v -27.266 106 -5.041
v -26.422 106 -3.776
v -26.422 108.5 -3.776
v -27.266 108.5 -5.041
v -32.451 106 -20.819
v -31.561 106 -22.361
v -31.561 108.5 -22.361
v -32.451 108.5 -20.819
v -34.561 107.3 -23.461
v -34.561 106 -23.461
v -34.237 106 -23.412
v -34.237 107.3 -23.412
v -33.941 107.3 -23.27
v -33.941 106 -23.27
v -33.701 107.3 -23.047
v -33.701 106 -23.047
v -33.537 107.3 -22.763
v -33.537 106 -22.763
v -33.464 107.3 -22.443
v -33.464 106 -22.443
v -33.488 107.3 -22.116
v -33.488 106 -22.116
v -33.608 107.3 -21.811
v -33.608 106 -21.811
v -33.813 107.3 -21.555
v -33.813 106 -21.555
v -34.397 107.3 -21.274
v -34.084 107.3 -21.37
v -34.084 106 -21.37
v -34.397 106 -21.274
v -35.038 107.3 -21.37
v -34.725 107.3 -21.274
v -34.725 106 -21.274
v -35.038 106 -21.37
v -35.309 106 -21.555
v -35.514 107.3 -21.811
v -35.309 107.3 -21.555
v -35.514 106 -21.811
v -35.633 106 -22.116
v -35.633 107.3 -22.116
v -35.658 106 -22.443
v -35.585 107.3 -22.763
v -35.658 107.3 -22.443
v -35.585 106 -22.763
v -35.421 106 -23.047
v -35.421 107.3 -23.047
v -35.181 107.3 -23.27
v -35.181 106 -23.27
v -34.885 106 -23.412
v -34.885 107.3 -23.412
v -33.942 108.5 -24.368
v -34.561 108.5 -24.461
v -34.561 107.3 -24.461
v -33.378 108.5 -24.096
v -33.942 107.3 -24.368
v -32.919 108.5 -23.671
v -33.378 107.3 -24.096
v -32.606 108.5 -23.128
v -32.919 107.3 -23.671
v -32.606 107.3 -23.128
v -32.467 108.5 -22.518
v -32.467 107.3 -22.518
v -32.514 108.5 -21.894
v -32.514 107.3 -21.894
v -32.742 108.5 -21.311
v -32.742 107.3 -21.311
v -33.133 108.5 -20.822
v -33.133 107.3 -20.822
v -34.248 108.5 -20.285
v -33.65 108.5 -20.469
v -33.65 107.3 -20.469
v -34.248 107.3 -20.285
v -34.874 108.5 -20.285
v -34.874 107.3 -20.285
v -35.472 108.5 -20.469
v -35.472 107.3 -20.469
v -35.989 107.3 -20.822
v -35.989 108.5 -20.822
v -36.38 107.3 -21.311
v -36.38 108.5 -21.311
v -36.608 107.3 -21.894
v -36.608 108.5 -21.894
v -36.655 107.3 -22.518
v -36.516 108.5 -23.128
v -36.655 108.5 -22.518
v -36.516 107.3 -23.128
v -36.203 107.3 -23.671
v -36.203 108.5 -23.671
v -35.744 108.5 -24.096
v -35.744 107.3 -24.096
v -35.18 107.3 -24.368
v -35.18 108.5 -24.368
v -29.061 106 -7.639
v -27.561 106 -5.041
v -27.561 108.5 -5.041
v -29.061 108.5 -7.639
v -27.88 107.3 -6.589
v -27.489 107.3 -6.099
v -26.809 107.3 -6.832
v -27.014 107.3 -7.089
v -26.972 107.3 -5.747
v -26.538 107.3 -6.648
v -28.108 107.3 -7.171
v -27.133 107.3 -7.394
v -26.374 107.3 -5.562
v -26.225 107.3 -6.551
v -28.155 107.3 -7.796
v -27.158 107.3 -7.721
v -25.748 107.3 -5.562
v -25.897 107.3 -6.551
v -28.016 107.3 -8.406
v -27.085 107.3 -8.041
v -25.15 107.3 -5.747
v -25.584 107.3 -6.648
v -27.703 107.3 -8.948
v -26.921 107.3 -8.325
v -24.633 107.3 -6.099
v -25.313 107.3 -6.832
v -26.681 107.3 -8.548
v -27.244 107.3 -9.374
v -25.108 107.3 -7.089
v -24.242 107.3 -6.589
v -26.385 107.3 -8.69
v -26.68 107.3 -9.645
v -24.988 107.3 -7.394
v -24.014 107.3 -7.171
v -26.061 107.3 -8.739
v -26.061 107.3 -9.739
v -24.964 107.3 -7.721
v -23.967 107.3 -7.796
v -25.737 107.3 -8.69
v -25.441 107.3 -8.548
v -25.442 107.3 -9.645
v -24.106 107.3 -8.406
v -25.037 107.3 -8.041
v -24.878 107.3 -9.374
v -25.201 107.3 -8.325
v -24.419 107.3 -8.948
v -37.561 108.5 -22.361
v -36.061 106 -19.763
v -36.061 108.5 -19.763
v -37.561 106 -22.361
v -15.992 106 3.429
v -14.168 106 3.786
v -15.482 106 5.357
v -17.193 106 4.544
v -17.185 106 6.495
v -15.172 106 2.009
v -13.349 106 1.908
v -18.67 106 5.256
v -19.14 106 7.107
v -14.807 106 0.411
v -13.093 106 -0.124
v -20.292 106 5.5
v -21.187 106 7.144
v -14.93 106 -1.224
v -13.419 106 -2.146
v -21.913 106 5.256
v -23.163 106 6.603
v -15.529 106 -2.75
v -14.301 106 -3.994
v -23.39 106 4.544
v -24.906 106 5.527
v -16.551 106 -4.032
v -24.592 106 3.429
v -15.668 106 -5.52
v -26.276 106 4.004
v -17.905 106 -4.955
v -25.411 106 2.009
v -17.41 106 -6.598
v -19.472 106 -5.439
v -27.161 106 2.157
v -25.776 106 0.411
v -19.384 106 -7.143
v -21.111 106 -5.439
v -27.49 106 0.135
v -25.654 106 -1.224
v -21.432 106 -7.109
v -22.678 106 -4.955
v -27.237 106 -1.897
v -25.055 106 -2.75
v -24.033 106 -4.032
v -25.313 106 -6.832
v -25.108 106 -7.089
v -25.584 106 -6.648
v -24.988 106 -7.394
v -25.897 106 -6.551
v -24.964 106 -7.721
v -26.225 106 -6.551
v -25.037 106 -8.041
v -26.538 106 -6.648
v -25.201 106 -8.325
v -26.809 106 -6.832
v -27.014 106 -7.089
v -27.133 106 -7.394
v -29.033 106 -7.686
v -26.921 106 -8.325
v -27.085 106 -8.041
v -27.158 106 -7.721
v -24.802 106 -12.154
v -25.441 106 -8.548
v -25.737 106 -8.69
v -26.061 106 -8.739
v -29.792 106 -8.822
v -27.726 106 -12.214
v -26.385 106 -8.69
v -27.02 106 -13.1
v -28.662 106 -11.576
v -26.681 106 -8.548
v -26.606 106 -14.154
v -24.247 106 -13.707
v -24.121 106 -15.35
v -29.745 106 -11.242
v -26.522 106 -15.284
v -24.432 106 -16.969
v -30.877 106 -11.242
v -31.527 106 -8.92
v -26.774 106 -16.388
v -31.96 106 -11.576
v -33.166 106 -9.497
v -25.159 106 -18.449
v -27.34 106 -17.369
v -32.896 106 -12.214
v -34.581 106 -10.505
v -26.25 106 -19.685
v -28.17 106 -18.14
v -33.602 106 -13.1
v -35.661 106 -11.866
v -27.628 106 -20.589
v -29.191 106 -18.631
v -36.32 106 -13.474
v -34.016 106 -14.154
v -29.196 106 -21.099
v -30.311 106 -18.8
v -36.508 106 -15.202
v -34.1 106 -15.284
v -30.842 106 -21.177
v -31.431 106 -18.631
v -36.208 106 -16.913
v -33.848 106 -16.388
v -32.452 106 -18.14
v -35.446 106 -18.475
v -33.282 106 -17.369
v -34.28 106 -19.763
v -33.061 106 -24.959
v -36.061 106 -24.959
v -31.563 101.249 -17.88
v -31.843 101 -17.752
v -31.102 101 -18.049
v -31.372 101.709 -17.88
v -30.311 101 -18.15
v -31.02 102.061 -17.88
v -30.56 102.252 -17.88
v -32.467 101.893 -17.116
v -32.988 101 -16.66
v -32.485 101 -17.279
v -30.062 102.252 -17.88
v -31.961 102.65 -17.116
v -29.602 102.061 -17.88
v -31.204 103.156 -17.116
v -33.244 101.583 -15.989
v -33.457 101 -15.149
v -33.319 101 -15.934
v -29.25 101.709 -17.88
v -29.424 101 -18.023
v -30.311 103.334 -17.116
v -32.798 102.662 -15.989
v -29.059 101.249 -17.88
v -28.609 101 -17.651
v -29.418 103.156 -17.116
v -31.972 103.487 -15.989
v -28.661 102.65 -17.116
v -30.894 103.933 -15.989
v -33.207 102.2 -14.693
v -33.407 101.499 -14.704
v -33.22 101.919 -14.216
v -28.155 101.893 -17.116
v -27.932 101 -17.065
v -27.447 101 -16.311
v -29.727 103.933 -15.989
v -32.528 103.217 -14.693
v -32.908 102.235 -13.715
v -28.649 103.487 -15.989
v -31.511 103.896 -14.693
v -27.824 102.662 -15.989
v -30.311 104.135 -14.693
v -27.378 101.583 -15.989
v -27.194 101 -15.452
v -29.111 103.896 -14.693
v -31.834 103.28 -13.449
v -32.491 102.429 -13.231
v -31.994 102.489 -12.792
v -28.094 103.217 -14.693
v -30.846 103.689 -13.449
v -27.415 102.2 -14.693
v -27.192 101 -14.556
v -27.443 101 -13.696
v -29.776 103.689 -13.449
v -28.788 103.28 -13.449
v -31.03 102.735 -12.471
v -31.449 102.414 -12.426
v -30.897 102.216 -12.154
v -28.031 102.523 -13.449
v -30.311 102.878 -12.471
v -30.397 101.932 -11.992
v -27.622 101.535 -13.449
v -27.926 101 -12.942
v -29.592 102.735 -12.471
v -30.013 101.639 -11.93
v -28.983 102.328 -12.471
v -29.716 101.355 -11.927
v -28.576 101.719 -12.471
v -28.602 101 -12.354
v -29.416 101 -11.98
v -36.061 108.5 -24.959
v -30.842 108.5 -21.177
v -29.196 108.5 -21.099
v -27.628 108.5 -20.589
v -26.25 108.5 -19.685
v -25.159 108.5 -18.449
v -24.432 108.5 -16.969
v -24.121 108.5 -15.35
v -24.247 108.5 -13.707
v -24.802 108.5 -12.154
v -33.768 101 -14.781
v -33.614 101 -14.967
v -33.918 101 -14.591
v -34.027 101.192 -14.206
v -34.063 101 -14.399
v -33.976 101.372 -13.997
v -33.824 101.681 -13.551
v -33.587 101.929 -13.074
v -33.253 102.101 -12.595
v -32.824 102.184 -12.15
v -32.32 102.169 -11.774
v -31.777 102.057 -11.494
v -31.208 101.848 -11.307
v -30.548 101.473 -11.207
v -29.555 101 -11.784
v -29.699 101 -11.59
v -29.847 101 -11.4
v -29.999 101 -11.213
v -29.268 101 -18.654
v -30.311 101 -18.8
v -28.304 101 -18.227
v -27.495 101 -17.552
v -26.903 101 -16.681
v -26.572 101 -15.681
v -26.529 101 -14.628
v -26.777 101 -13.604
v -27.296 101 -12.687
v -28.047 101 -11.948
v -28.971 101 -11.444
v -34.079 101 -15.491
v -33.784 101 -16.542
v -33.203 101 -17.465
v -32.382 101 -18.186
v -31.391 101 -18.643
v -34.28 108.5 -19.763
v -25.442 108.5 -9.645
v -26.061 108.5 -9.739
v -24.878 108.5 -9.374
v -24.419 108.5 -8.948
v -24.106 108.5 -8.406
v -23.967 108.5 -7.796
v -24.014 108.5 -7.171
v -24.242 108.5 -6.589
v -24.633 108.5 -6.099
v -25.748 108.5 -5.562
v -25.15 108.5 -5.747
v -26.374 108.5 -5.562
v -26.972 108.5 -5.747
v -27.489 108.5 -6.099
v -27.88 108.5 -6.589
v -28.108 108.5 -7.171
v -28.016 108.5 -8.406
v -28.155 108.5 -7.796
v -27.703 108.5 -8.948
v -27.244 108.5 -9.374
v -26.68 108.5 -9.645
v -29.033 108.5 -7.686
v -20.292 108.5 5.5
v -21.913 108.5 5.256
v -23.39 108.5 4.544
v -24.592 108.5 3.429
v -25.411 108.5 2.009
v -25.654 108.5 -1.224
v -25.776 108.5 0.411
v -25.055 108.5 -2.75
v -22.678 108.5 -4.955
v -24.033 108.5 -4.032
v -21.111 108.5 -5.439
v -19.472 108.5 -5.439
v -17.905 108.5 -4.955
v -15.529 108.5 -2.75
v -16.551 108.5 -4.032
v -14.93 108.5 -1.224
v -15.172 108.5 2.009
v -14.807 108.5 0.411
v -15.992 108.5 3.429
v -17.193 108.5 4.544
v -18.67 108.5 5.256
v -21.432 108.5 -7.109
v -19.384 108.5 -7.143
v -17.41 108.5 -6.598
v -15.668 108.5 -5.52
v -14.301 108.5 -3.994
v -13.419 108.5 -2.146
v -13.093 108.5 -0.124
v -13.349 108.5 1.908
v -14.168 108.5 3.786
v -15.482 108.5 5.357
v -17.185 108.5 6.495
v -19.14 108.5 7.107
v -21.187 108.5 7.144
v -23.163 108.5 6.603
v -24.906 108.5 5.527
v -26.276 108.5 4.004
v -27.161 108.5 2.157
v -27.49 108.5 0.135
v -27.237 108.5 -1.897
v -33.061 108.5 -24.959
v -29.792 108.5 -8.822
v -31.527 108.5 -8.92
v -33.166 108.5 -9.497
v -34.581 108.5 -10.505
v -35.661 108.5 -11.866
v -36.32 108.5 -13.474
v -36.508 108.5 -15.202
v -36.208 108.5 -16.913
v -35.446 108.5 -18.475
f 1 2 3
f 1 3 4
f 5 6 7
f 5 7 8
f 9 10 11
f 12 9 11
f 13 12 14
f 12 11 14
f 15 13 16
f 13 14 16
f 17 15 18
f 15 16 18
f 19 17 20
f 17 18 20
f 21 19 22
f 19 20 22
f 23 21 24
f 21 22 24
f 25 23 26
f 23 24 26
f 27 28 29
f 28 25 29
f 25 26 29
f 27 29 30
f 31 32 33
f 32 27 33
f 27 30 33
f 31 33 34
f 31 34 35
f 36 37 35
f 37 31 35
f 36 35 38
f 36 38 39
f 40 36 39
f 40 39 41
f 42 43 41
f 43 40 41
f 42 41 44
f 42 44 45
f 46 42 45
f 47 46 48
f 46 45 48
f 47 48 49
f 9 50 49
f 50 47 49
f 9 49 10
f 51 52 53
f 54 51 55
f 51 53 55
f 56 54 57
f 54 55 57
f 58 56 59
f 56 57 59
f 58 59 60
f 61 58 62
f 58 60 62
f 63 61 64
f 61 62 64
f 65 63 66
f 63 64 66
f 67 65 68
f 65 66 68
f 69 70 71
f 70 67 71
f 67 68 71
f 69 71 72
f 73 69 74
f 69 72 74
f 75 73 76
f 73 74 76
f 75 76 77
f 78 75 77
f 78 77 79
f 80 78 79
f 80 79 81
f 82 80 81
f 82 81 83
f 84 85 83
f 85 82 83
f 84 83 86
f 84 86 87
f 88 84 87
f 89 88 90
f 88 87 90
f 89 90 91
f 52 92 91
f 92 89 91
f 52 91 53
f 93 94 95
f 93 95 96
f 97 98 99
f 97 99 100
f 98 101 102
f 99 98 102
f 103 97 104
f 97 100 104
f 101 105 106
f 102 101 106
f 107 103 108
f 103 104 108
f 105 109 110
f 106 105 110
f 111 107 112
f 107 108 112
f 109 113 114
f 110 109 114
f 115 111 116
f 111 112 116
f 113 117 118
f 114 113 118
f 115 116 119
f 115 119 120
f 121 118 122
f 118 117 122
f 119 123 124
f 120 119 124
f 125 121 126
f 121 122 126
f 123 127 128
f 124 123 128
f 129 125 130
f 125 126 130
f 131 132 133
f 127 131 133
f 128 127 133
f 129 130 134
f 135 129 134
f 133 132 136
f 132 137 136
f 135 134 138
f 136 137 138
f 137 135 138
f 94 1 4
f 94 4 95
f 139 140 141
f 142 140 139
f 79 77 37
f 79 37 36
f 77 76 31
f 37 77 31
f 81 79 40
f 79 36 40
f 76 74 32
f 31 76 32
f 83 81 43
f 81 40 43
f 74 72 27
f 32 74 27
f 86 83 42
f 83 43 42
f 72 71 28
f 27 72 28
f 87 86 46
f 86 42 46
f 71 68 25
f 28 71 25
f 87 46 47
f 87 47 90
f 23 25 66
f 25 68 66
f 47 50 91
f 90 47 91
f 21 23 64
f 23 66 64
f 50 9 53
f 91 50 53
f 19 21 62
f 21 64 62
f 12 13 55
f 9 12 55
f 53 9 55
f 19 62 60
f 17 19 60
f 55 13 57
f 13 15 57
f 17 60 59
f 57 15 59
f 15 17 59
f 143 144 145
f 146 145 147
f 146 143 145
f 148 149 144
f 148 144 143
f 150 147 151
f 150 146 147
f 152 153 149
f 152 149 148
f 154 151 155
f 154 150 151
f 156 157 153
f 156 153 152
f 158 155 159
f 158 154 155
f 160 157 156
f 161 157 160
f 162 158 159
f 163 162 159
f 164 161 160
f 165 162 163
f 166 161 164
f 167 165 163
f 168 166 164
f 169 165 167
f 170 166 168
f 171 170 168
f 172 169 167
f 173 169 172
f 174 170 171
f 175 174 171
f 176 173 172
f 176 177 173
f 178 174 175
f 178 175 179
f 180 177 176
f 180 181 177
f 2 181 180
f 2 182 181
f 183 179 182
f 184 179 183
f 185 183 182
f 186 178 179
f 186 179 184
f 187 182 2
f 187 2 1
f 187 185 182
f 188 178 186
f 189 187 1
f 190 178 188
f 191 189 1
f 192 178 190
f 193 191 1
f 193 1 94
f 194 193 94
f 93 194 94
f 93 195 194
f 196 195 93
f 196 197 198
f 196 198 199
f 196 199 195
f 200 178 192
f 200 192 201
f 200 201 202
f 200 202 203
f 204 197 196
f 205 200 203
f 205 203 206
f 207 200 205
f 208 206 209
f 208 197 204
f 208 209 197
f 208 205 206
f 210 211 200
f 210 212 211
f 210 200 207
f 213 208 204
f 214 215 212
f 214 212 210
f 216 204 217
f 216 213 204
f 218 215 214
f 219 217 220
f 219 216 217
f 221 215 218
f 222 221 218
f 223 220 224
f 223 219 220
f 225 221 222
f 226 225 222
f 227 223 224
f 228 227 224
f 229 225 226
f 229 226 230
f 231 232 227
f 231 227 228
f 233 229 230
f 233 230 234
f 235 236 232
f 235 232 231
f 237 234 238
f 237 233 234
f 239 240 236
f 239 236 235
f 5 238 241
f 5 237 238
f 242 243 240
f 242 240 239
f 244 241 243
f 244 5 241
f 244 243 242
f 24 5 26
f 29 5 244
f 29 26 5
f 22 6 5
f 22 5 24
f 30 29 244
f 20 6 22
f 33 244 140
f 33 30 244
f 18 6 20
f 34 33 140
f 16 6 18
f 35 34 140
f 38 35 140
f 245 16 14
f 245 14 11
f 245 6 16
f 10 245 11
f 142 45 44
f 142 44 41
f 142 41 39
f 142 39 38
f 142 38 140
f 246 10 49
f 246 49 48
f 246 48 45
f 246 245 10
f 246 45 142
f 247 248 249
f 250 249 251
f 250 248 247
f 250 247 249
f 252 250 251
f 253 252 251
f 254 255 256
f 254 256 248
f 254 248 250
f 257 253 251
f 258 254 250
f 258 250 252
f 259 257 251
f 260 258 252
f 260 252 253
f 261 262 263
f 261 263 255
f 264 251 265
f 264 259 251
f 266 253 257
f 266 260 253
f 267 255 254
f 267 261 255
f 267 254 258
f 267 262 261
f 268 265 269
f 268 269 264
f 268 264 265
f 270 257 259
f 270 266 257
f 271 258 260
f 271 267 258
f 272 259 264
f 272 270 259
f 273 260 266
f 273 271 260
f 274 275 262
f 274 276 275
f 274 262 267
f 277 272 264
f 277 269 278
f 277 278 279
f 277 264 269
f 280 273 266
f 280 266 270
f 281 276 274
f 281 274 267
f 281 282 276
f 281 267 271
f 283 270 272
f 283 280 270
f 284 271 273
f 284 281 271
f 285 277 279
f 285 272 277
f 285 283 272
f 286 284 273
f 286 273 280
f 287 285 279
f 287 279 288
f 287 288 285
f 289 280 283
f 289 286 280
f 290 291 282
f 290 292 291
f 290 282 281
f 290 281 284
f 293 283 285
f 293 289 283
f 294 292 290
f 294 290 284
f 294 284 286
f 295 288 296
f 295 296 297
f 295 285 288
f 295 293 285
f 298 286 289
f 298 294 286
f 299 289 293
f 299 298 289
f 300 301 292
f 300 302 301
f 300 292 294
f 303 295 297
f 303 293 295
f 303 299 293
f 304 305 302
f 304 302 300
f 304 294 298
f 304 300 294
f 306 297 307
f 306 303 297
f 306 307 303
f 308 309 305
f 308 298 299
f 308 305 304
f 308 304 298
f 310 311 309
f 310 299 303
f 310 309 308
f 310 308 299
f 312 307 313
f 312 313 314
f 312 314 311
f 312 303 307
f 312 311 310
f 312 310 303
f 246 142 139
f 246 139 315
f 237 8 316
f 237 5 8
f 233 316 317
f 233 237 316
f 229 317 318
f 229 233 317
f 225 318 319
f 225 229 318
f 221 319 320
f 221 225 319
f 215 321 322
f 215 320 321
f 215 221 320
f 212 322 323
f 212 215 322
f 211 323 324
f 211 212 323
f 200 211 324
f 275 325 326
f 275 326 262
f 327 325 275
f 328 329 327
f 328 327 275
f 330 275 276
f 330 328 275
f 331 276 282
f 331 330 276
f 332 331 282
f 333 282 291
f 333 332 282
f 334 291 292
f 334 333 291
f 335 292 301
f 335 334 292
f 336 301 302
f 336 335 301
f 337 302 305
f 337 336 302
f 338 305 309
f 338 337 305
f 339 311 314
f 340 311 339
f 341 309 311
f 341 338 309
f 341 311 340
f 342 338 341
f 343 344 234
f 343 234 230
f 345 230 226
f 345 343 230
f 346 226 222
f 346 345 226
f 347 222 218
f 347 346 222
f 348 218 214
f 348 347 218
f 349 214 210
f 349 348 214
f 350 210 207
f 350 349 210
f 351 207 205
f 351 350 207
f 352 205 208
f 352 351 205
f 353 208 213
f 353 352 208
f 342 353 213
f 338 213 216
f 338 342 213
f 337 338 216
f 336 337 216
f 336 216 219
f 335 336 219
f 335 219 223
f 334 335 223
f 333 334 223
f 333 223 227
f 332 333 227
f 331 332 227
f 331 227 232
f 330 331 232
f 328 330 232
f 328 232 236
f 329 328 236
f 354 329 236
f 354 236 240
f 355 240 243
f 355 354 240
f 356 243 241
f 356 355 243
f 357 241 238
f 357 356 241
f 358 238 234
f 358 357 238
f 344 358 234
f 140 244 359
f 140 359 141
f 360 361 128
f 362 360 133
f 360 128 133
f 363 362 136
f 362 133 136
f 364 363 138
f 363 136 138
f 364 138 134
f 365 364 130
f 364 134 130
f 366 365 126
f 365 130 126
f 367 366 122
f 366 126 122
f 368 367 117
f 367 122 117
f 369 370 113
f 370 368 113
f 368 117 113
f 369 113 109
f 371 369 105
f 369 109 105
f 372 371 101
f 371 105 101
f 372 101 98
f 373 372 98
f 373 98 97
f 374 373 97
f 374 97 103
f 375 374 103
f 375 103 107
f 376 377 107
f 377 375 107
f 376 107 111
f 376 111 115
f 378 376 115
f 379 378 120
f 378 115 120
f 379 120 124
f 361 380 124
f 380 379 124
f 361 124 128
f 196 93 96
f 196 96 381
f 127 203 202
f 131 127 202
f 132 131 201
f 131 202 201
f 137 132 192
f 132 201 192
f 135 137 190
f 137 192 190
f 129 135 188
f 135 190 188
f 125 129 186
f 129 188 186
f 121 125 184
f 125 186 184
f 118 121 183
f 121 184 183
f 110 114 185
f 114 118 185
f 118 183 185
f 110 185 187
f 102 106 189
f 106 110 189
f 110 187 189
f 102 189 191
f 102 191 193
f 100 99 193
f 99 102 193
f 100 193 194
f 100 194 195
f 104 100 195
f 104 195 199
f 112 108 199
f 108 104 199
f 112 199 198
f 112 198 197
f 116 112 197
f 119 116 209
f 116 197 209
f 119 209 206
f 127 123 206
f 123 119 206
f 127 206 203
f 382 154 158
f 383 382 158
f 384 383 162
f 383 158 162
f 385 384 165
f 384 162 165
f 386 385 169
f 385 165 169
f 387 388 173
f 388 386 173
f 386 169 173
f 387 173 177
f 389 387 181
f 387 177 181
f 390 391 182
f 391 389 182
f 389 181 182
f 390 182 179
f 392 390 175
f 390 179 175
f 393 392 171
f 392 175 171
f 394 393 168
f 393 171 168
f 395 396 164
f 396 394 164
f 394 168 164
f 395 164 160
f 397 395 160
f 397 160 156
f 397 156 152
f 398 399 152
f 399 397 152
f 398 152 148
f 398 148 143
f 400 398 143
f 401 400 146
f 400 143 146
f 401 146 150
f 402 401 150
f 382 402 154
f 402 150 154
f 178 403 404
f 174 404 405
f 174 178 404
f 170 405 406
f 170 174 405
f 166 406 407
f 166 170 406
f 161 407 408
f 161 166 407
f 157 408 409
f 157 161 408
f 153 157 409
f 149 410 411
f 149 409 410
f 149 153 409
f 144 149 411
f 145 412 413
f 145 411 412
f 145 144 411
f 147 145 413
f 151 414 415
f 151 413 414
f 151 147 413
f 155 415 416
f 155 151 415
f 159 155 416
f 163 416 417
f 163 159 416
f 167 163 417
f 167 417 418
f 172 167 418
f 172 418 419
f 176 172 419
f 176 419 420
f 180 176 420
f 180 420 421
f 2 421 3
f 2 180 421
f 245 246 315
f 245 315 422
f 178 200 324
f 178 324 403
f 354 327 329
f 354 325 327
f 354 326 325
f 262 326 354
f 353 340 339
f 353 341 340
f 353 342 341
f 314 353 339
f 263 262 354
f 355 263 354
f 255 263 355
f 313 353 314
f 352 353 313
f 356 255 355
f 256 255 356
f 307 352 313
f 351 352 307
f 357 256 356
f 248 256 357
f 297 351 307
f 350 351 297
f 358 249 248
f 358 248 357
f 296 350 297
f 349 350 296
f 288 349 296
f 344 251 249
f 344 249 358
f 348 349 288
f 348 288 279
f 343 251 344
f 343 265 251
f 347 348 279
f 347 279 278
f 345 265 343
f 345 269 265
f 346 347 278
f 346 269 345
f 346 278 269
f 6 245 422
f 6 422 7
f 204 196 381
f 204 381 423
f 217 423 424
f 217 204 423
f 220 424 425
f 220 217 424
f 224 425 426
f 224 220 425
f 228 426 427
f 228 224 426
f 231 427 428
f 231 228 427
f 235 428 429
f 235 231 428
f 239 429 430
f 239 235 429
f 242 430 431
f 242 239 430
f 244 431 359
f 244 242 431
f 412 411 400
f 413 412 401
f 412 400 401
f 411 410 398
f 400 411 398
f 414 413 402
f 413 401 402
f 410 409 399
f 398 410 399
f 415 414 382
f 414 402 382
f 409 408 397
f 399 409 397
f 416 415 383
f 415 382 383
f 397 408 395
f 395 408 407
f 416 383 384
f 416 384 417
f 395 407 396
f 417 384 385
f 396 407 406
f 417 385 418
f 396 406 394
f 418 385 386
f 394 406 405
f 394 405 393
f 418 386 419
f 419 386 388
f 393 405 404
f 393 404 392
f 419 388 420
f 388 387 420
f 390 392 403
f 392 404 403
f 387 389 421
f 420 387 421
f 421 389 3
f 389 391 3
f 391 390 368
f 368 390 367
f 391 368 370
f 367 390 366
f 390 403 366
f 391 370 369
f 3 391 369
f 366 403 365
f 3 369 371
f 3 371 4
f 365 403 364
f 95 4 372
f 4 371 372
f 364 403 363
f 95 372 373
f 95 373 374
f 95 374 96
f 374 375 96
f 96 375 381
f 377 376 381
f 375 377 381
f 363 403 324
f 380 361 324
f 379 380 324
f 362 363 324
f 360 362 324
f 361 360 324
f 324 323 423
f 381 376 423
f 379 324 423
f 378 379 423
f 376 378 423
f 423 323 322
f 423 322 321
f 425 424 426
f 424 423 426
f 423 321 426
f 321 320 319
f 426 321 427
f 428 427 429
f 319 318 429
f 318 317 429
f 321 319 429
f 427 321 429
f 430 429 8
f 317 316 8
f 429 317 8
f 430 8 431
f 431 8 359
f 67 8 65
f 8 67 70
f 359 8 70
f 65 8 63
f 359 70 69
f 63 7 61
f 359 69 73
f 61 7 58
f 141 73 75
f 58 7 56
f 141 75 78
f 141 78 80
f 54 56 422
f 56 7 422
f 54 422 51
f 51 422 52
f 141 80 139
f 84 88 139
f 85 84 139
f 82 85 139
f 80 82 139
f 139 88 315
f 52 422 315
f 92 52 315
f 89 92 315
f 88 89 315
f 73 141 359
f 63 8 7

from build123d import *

# Parameters (mm, degrees)
RETAINER_FEATURE_1_PROFILE_R  = 3.8
RETAINER_FEATURE_1_DEPTH      = 5.02
RETAINER_FEATURE_2_PROFILE_R  = 6.2
RETAINER_FEATURE_2_DEPTH      = 2.5
RETAINER_FEATURE_5_DEPTH      = 2.5
RETAINER_FEATURE_8_DEPTH      = 2.5
RETAINER_FEATURE_12_DEPTH     = 2.5
RETAINER_FEATURE_13_PROFILE_R = 7.2
RETAINER_FEATURE_13_DEPTH     = 2.5
RETAINER_FEATURE_14_PROFILE_R = 5.5
RETAINER_FEATURE_14_DEPTH     = 2.7
RETAINER_FEATURE_15_PROFILE_R = 1.1
RETAINER_FEATURE_15_DEPTH     = 3.75
RETAINER_FEATURE_16_PROFILE_R = 2.1
RETAINER_FEATURE_16_DEPTH     = 1.45
RETAINER_FEATURE_17_PROFILE_R = 1.1
RETAINER_FEATURE_17_DEPTH     = 3.75
RETAINER_FEATURE_18_PROFILE_R = 2.1
RETAINER_FEATURE_18_DEPTH     = 1.45


with BuildPart() as part:
    # Retainer Feature 1 profile → Retainer Feature 1 (new body)
    with BuildSketch(Plane(origin=(0, -101, 0), x_dir=(-1, 0, 0), z_dir=(0, -1, 0))):
        with Locations(Location((30.310889132, 15, 0), (0, 0, 90))):
            Circle(RETAINER_FEATURE_1_PROFILE_R)
    extrude(amount=RETAINER_FEATURE_1_DEPTH)

    # Retainer Feature 2 profile → Retainer Feature 2 (add)
    with BuildSketch(Plane(origin=(0, -106, 0), x_dir=(-1, 0, 0), z_dir=(0, -1, 0))):
        with Locations(Location((30.310889132, 15, 0), (0, 0, 90))):
            Circle(RETAINER_FEATURE_2_PROFILE_R)
    extrude(amount=RETAINER_FEATURE_2_DEPTH)

    # Middle Right Floating Compression Ball R → Retainer Feature 5 (add)
    with BuildSketch(Plane(origin=(0, -106, 0), x_dir=(-1, 0, 0), z_dir=(0, -1, 0))):
        Polygon((31.560889132, 22.361215932), (33.060889132, 19.763139721), (36.060889132, 19.763139721), (37.560889132, 22.361215932), (36.060889132, 24.959292144), (33.060889132, 24.959292144), align=None)
    extrude(amount=RETAINER_FEATURE_5_DEPTH)

    # Middle Right Floating Compression Ba 2 → Retainer Feature 8 (add)
    with BuildSketch(Plane(origin=(0, -106, 0), x_dir=(-1, 0, 0), z_dir=(0, -1, 0))):
        Polygon((23.060889132, 7.638784068), (24.560889132, 5.040707856), (27.560889132, 5.040707856), (29.060889132, 7.638784068), (27.560889132, 10.236860279), (24.560889132, 10.236860279), align=None)
    extrude(amount=RETAINER_FEATURE_8_DEPTH)

    # Retainer Feature 9 profile → Retainer Feature 9 (revolve, cut)
    with BuildSketch(Plane(origin=(0, -101, 0), x_dir=(-1, 0, 0), z_dir=(0, -1, 0))):
        with BuildLine():
            Line((30.310889132, 11.85), (30.310889132, 18.15))
            ThreePointArc((30.310889132, 18.15), (27.160889132, 15), (30.310889132, 11.85))
        make_face()
    revolve(axis=Axis((-30.310889132, -101, -25), (0, 0, 1)), mode=Mode.SUBTRACT)

    # Middle Right Floating Compression Ba 3 → Retainer Feature 12 (add)
    with BuildSketch(Plane(origin=(0, -106, 0), x_dir=(-1, 0, 0), z_dir=(0, -1, 0))):
        Polygon((27.816215917, 16.66631496), (17.79697803, 1.66631496), (22.786324462, -1.66631496), (32.805562348, 13.33368504), align=None)
    extrude(amount=RETAINER_FEATURE_12_DEPTH)

    # Retainer Feature 13 profile → Retainer Feature 13 (add)
    with BuildSketch(Plane(origin=(0, -106, 0), x_dir=(-1, 0, 0), z_dir=(0, -1, 0))):
        with Locations((20.291651246, 0)):
            Circle(RETAINER_FEATURE_13_PROFILE_R)
    extrude(amount=RETAINER_FEATURE_13_DEPTH)

    # Retainer Feature 14 profile → Retainer Feature 14 (cut)
    with BuildSketch(Plane(origin=(0, -105.9, 0), x_dir=(-1, 0, 0), z_dir=(0, -1, 0))):
        with Locations(Location((20.291651246, 0, 0), (0, 0, 270))):
            Circle(RETAINER_FEATURE_14_PROFILE_R)
    extrude(amount=RETAINER_FEATURE_14_DEPTH, mode=Mode.SUBTRACT)

    # Retainer Feature 15 profile → Retainer Feature 15 (cut)
    with BuildSketch(Plane(origin=(0, -105, 0), x_dir=(-1, 0, 0), z_dir=(0, -1, 0))):
        with Locations(Location((34.560889132, 22.361215932, 0), (0, 0, 90))):
            Circle(RETAINER_FEATURE_15_PROFILE_R)
    extrude(amount=RETAINER_FEATURE_15_DEPTH, mode=Mode.SUBTRACT)

    # Retainer Feature 16 profile → Retainer Feature 16 (cut)
    with BuildSketch(Plane(origin=(0, -107.3, 0), x_dir=(-1, 0, 0), z_dir=(0, -1, 0))):
        with Locations(Location((34.560889132, 22.361215932, 0), (0, 0, 90))):
            Circle(RETAINER_FEATURE_16_PROFILE_R)
    extrude(amount=RETAINER_FEATURE_16_DEPTH, mode=Mode.SUBTRACT)

    # Retainer Feature 17 profile → Retainer Feature 17 (cut)
    with BuildSketch(Plane(origin=(0, -105, 0), x_dir=(-1, 0, 0), z_dir=(0, -1, 0))):
        with Locations(Location((26.060889132, 7.638784068, 0), (0, 0, 90))):
            Circle(RETAINER_FEATURE_17_PROFILE_R)
    extrude(amount=RETAINER_FEATURE_17_DEPTH, mode=Mode.SUBTRACT)

    # Retainer Feature 18 profile → Retainer Feature 18 (cut)
    with BuildSketch(Plane(origin=(0, -107.3, 0), x_dir=(-1, 0, 0), z_dir=(0, -1, 0))):
        with Locations(Location((26.060889132, 7.638784068, 0), (0, 0, 90))):
            Circle(RETAINER_FEATURE_18_PROFILE_R)
    extrude(amount=RETAINER_FEATURE_18_DEPTH, mode=Mode.SUBTRACT)

    # Articulation Throat Sketch → Articulation Throat (revolve, cut)
    with BuildSketch(Plane(origin=(-55.559435073, -21.315405316, -26.260716517), x_dir=(0.37694407644157146, 0.1446147852349051, -0.9148768917876727), z_dir=(0.8541721659092646, 0.32770358269776195, 0.4037329227012915))):
        Polygon((-12.308450042, -83.441173866), (-10.724100051, -81.773890115), (-22.767880189, -61.059022025), (-28.981287547, -67.597673951), align=None)
    revolve(axis=Axis((-25.110986143, -106.383086561, -21.631997284), (-0.5199902989343897, 0.5383086561091633, 0.6631997284167648)), mode=Mode.SUBTRACT)


with BuildPart() as body_2:
    # Mirror1: mirrored copy
    add(part.part.mirror(Plane(origin=(0, 0, 0), x_dir=(0, 0, 1), z_dir=(0, -1, 0))))


solid = body_2.part
